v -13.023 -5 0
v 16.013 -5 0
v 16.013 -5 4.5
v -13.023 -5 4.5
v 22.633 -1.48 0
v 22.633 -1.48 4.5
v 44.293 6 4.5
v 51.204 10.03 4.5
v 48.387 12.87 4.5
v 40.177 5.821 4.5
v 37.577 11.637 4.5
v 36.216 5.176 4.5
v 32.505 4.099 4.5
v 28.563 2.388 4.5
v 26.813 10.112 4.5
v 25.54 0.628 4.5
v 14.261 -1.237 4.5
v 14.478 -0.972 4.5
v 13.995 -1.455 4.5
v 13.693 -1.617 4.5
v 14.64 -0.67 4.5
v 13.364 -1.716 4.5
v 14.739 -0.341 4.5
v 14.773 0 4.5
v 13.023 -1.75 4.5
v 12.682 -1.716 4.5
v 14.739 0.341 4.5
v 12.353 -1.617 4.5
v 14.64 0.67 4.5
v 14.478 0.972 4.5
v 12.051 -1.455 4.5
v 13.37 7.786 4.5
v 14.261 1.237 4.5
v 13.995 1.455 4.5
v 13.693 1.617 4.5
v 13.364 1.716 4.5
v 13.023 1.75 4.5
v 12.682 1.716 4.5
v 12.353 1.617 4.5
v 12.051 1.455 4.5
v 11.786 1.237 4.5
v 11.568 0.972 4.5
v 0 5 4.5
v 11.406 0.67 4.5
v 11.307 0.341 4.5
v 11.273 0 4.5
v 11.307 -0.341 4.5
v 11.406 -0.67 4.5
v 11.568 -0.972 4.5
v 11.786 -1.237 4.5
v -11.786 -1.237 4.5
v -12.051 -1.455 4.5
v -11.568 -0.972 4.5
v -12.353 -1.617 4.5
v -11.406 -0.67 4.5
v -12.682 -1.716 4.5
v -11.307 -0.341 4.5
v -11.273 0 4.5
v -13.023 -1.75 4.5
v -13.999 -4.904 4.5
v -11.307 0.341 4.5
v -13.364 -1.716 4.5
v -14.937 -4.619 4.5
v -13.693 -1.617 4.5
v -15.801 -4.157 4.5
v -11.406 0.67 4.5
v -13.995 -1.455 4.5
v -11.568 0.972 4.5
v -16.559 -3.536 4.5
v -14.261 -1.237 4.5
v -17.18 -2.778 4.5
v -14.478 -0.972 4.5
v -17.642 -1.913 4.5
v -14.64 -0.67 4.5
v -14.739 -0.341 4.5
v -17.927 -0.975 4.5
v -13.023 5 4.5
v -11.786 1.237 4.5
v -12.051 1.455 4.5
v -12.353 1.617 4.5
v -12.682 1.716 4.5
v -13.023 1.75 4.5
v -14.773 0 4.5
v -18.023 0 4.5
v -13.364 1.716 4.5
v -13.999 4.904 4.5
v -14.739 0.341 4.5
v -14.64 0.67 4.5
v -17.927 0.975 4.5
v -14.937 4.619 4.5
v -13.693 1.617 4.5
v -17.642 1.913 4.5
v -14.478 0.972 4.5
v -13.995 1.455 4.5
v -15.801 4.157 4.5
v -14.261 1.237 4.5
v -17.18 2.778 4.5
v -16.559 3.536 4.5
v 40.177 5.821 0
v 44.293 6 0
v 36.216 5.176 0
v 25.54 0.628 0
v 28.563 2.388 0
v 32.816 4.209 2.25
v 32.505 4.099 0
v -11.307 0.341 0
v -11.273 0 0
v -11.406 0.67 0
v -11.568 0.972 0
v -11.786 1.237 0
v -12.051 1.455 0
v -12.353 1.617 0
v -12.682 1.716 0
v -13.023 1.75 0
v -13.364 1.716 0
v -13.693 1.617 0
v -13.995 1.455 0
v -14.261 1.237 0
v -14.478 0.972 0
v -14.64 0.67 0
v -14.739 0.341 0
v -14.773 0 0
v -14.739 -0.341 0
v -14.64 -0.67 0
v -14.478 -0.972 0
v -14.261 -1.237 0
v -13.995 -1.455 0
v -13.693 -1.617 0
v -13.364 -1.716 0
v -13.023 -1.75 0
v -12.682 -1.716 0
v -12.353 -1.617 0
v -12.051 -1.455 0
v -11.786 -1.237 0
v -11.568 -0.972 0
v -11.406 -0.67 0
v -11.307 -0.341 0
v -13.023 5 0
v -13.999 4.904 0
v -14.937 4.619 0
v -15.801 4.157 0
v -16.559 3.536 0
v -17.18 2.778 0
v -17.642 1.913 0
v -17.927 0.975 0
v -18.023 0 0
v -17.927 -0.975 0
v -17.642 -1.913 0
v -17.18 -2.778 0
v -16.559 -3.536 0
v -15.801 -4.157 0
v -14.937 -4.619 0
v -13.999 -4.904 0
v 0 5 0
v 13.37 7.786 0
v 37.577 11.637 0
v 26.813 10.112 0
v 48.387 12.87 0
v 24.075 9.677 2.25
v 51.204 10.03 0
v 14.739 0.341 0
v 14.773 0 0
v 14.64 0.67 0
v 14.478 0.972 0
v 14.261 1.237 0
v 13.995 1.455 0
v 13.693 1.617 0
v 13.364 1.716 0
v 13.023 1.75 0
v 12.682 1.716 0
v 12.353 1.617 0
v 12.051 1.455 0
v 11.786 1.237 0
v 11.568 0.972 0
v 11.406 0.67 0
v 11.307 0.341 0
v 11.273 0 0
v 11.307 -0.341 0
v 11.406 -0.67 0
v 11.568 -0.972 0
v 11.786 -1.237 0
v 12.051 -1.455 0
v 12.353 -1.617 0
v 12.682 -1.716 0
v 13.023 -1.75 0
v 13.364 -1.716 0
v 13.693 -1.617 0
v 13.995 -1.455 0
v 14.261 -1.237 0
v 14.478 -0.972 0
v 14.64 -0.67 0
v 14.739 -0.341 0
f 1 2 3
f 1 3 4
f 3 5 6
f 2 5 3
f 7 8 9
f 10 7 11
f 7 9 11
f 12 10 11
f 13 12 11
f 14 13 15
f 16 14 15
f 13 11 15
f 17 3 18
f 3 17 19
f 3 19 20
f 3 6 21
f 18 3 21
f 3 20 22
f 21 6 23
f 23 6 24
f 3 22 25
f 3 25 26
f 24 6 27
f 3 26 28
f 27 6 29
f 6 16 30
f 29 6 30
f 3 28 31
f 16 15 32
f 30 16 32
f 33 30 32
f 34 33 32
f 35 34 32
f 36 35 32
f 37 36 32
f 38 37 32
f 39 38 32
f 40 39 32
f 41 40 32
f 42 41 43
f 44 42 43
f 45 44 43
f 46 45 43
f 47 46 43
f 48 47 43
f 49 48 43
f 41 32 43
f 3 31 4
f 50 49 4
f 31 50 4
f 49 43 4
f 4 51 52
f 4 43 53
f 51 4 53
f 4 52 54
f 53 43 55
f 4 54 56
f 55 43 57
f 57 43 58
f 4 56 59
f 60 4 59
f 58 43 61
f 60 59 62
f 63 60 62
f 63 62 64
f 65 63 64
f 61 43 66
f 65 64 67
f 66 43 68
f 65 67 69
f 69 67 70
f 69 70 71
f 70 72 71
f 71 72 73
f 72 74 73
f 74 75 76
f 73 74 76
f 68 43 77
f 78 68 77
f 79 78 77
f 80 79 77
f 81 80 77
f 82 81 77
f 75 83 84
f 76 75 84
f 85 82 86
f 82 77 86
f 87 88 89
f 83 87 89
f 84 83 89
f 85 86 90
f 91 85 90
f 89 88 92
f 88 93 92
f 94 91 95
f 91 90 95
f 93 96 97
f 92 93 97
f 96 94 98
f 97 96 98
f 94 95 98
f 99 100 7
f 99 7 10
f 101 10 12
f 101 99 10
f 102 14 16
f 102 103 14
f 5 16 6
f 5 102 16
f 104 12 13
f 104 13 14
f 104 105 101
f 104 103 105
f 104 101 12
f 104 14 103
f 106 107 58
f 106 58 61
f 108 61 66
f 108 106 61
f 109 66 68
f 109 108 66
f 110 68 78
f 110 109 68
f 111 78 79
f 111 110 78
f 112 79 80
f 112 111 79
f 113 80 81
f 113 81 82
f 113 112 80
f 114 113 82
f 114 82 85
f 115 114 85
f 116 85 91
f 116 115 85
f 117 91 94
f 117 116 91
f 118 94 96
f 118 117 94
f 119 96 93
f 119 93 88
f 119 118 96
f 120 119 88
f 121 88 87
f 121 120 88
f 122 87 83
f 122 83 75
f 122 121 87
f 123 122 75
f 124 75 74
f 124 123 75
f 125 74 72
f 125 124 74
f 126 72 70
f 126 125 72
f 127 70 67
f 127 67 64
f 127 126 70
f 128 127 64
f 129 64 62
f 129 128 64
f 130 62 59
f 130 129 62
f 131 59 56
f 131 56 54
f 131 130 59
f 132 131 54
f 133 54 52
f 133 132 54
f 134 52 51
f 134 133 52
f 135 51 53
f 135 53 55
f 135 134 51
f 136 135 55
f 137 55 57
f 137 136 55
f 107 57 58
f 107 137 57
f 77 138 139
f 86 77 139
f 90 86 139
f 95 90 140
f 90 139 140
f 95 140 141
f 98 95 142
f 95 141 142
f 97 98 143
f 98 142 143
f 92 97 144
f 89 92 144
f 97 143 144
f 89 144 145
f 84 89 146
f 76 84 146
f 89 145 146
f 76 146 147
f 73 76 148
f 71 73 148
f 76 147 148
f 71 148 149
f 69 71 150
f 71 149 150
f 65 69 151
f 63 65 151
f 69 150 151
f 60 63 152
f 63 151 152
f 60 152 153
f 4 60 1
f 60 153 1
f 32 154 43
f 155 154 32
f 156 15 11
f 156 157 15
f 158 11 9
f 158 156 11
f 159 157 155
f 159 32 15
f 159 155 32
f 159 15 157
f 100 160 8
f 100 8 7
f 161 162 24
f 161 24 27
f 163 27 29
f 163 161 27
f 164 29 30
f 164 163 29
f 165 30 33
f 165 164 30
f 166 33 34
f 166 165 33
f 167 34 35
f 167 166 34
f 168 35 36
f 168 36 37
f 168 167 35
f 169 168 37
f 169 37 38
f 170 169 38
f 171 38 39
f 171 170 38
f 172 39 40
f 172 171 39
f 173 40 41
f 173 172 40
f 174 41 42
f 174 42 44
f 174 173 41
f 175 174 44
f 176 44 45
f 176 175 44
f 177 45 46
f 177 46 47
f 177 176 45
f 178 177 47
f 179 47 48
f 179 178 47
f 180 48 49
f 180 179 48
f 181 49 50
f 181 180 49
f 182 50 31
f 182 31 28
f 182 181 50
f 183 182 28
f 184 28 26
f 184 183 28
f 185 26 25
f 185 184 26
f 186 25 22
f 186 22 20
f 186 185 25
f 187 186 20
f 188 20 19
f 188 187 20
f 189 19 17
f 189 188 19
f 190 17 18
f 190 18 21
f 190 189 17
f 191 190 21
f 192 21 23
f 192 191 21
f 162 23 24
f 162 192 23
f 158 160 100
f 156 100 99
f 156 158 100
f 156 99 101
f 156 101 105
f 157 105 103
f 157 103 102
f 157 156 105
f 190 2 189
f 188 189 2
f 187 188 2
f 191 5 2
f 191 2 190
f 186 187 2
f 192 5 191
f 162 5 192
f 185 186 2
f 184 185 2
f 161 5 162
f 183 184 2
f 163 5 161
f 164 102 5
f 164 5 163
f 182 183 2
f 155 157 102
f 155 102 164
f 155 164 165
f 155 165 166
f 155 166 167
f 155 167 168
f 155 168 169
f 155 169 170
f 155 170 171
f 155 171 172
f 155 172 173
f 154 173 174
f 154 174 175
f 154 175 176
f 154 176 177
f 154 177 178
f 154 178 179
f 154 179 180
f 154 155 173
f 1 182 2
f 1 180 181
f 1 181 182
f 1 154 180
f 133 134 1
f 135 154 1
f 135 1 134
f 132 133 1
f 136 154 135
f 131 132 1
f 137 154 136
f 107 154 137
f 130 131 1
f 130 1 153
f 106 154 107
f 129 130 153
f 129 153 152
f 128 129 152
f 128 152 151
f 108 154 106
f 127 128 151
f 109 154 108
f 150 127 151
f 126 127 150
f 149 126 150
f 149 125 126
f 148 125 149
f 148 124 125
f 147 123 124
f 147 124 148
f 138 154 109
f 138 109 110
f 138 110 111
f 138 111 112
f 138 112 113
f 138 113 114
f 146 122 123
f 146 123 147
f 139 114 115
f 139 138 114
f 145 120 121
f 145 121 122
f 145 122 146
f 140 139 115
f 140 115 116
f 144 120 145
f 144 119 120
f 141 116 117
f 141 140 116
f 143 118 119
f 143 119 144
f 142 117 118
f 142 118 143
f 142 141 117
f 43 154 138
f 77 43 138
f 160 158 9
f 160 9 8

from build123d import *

# Parameters (mm, degrees)
SKETCH1_R           = 5
SKETCH1_R_2         = 1.75
BOSS_EXTRUDE1_DEPTH = 4.5
BOSS_EXTRUDE2_START = -4.5
BOSS_EXTRUDE2_DEPTH = 4.5


with BuildPart() as part:
    # Sketch1 → Boss-Extrude1 (new body)
    # profile 1 of 3: a face of its own
    with BuildSketch(Plane.XY):
        with Locations((-13.023088496, 0)):
            Circle(SKETCH1_R)
        with Locations((-13.023088496, 0)):
            Circle(SKETCH1_R_2, mode=Mode.SUBTRACT)
    # profile 2 of 3: a face of its own
    with BuildSketch(Plane.XY):
        with Locations((13.023088496, 0)):
            Circle(SKETCH1_R)
        with Locations((13.023088496, 0)):
            Circle(SKETCH1_R_2, mode=Mode.SUBTRACT)
    # profile 3 of 3: a face of its own
    with BuildSketch(Plane.XY):
        with BuildLine():
            Line((-13.023088477, -5), (13.023088496, -5))
            ThreePointArc((13.023088496, -5), (8.023088496, 0), (13.023088496, 5))
            Line((13.023088496, 5), (-13.02308848, 5))
            ThreePointArc((-13.02308848, 5), (-9.487554585, 3.5355339), (-8.023088496, 0))
            ThreePointArc((-8.023088496, 0), (-9.487554584, -3.535533899), (-13.023088477, -5))
        make_face()
    extrude(amount=BOSS_EXTRUDE1_DEPTH)

    # Sketch2 → Boss-Extrude2 (add)
    with BuildSketch(Plane.XY.offset(4.5).offset(BOSS_EXTRUDE2_START)):
        with BuildLine():
            Line((48.387077696, 12.87), (51.203884398, 10.03))
            Line((51.203884398, 10.03), (44.293088496, 6))
            add(Edge.make_bspline(
                [(44.293088496, 6), (32.169239244, 6.157348305), (22.633088496, -1.48)],
                knots=[0, 0, 0, 1, 1, 1], degree=2))
            Line((22.633088496, -1.48), (16.013088496, -5))
            Line((16.013088496, -5), (13.023088496, -5))
            ThreePointArc((13.023088496, -5), (18.023088496, 0), (13.023088496, 5))
            Line((13.023088496, 5), (0, 5))
            add(Edge.make_bspline(
                [(0, 5), (23.957075796, 10.418061583), (48.387077696, 12.87)],
                knots=[0, 0, 0, 1, 1, 1], degree=2))
        make_face()
    extrude(amount=BOSS_EXTRUDE2_DEPTH)


solid = part.part
